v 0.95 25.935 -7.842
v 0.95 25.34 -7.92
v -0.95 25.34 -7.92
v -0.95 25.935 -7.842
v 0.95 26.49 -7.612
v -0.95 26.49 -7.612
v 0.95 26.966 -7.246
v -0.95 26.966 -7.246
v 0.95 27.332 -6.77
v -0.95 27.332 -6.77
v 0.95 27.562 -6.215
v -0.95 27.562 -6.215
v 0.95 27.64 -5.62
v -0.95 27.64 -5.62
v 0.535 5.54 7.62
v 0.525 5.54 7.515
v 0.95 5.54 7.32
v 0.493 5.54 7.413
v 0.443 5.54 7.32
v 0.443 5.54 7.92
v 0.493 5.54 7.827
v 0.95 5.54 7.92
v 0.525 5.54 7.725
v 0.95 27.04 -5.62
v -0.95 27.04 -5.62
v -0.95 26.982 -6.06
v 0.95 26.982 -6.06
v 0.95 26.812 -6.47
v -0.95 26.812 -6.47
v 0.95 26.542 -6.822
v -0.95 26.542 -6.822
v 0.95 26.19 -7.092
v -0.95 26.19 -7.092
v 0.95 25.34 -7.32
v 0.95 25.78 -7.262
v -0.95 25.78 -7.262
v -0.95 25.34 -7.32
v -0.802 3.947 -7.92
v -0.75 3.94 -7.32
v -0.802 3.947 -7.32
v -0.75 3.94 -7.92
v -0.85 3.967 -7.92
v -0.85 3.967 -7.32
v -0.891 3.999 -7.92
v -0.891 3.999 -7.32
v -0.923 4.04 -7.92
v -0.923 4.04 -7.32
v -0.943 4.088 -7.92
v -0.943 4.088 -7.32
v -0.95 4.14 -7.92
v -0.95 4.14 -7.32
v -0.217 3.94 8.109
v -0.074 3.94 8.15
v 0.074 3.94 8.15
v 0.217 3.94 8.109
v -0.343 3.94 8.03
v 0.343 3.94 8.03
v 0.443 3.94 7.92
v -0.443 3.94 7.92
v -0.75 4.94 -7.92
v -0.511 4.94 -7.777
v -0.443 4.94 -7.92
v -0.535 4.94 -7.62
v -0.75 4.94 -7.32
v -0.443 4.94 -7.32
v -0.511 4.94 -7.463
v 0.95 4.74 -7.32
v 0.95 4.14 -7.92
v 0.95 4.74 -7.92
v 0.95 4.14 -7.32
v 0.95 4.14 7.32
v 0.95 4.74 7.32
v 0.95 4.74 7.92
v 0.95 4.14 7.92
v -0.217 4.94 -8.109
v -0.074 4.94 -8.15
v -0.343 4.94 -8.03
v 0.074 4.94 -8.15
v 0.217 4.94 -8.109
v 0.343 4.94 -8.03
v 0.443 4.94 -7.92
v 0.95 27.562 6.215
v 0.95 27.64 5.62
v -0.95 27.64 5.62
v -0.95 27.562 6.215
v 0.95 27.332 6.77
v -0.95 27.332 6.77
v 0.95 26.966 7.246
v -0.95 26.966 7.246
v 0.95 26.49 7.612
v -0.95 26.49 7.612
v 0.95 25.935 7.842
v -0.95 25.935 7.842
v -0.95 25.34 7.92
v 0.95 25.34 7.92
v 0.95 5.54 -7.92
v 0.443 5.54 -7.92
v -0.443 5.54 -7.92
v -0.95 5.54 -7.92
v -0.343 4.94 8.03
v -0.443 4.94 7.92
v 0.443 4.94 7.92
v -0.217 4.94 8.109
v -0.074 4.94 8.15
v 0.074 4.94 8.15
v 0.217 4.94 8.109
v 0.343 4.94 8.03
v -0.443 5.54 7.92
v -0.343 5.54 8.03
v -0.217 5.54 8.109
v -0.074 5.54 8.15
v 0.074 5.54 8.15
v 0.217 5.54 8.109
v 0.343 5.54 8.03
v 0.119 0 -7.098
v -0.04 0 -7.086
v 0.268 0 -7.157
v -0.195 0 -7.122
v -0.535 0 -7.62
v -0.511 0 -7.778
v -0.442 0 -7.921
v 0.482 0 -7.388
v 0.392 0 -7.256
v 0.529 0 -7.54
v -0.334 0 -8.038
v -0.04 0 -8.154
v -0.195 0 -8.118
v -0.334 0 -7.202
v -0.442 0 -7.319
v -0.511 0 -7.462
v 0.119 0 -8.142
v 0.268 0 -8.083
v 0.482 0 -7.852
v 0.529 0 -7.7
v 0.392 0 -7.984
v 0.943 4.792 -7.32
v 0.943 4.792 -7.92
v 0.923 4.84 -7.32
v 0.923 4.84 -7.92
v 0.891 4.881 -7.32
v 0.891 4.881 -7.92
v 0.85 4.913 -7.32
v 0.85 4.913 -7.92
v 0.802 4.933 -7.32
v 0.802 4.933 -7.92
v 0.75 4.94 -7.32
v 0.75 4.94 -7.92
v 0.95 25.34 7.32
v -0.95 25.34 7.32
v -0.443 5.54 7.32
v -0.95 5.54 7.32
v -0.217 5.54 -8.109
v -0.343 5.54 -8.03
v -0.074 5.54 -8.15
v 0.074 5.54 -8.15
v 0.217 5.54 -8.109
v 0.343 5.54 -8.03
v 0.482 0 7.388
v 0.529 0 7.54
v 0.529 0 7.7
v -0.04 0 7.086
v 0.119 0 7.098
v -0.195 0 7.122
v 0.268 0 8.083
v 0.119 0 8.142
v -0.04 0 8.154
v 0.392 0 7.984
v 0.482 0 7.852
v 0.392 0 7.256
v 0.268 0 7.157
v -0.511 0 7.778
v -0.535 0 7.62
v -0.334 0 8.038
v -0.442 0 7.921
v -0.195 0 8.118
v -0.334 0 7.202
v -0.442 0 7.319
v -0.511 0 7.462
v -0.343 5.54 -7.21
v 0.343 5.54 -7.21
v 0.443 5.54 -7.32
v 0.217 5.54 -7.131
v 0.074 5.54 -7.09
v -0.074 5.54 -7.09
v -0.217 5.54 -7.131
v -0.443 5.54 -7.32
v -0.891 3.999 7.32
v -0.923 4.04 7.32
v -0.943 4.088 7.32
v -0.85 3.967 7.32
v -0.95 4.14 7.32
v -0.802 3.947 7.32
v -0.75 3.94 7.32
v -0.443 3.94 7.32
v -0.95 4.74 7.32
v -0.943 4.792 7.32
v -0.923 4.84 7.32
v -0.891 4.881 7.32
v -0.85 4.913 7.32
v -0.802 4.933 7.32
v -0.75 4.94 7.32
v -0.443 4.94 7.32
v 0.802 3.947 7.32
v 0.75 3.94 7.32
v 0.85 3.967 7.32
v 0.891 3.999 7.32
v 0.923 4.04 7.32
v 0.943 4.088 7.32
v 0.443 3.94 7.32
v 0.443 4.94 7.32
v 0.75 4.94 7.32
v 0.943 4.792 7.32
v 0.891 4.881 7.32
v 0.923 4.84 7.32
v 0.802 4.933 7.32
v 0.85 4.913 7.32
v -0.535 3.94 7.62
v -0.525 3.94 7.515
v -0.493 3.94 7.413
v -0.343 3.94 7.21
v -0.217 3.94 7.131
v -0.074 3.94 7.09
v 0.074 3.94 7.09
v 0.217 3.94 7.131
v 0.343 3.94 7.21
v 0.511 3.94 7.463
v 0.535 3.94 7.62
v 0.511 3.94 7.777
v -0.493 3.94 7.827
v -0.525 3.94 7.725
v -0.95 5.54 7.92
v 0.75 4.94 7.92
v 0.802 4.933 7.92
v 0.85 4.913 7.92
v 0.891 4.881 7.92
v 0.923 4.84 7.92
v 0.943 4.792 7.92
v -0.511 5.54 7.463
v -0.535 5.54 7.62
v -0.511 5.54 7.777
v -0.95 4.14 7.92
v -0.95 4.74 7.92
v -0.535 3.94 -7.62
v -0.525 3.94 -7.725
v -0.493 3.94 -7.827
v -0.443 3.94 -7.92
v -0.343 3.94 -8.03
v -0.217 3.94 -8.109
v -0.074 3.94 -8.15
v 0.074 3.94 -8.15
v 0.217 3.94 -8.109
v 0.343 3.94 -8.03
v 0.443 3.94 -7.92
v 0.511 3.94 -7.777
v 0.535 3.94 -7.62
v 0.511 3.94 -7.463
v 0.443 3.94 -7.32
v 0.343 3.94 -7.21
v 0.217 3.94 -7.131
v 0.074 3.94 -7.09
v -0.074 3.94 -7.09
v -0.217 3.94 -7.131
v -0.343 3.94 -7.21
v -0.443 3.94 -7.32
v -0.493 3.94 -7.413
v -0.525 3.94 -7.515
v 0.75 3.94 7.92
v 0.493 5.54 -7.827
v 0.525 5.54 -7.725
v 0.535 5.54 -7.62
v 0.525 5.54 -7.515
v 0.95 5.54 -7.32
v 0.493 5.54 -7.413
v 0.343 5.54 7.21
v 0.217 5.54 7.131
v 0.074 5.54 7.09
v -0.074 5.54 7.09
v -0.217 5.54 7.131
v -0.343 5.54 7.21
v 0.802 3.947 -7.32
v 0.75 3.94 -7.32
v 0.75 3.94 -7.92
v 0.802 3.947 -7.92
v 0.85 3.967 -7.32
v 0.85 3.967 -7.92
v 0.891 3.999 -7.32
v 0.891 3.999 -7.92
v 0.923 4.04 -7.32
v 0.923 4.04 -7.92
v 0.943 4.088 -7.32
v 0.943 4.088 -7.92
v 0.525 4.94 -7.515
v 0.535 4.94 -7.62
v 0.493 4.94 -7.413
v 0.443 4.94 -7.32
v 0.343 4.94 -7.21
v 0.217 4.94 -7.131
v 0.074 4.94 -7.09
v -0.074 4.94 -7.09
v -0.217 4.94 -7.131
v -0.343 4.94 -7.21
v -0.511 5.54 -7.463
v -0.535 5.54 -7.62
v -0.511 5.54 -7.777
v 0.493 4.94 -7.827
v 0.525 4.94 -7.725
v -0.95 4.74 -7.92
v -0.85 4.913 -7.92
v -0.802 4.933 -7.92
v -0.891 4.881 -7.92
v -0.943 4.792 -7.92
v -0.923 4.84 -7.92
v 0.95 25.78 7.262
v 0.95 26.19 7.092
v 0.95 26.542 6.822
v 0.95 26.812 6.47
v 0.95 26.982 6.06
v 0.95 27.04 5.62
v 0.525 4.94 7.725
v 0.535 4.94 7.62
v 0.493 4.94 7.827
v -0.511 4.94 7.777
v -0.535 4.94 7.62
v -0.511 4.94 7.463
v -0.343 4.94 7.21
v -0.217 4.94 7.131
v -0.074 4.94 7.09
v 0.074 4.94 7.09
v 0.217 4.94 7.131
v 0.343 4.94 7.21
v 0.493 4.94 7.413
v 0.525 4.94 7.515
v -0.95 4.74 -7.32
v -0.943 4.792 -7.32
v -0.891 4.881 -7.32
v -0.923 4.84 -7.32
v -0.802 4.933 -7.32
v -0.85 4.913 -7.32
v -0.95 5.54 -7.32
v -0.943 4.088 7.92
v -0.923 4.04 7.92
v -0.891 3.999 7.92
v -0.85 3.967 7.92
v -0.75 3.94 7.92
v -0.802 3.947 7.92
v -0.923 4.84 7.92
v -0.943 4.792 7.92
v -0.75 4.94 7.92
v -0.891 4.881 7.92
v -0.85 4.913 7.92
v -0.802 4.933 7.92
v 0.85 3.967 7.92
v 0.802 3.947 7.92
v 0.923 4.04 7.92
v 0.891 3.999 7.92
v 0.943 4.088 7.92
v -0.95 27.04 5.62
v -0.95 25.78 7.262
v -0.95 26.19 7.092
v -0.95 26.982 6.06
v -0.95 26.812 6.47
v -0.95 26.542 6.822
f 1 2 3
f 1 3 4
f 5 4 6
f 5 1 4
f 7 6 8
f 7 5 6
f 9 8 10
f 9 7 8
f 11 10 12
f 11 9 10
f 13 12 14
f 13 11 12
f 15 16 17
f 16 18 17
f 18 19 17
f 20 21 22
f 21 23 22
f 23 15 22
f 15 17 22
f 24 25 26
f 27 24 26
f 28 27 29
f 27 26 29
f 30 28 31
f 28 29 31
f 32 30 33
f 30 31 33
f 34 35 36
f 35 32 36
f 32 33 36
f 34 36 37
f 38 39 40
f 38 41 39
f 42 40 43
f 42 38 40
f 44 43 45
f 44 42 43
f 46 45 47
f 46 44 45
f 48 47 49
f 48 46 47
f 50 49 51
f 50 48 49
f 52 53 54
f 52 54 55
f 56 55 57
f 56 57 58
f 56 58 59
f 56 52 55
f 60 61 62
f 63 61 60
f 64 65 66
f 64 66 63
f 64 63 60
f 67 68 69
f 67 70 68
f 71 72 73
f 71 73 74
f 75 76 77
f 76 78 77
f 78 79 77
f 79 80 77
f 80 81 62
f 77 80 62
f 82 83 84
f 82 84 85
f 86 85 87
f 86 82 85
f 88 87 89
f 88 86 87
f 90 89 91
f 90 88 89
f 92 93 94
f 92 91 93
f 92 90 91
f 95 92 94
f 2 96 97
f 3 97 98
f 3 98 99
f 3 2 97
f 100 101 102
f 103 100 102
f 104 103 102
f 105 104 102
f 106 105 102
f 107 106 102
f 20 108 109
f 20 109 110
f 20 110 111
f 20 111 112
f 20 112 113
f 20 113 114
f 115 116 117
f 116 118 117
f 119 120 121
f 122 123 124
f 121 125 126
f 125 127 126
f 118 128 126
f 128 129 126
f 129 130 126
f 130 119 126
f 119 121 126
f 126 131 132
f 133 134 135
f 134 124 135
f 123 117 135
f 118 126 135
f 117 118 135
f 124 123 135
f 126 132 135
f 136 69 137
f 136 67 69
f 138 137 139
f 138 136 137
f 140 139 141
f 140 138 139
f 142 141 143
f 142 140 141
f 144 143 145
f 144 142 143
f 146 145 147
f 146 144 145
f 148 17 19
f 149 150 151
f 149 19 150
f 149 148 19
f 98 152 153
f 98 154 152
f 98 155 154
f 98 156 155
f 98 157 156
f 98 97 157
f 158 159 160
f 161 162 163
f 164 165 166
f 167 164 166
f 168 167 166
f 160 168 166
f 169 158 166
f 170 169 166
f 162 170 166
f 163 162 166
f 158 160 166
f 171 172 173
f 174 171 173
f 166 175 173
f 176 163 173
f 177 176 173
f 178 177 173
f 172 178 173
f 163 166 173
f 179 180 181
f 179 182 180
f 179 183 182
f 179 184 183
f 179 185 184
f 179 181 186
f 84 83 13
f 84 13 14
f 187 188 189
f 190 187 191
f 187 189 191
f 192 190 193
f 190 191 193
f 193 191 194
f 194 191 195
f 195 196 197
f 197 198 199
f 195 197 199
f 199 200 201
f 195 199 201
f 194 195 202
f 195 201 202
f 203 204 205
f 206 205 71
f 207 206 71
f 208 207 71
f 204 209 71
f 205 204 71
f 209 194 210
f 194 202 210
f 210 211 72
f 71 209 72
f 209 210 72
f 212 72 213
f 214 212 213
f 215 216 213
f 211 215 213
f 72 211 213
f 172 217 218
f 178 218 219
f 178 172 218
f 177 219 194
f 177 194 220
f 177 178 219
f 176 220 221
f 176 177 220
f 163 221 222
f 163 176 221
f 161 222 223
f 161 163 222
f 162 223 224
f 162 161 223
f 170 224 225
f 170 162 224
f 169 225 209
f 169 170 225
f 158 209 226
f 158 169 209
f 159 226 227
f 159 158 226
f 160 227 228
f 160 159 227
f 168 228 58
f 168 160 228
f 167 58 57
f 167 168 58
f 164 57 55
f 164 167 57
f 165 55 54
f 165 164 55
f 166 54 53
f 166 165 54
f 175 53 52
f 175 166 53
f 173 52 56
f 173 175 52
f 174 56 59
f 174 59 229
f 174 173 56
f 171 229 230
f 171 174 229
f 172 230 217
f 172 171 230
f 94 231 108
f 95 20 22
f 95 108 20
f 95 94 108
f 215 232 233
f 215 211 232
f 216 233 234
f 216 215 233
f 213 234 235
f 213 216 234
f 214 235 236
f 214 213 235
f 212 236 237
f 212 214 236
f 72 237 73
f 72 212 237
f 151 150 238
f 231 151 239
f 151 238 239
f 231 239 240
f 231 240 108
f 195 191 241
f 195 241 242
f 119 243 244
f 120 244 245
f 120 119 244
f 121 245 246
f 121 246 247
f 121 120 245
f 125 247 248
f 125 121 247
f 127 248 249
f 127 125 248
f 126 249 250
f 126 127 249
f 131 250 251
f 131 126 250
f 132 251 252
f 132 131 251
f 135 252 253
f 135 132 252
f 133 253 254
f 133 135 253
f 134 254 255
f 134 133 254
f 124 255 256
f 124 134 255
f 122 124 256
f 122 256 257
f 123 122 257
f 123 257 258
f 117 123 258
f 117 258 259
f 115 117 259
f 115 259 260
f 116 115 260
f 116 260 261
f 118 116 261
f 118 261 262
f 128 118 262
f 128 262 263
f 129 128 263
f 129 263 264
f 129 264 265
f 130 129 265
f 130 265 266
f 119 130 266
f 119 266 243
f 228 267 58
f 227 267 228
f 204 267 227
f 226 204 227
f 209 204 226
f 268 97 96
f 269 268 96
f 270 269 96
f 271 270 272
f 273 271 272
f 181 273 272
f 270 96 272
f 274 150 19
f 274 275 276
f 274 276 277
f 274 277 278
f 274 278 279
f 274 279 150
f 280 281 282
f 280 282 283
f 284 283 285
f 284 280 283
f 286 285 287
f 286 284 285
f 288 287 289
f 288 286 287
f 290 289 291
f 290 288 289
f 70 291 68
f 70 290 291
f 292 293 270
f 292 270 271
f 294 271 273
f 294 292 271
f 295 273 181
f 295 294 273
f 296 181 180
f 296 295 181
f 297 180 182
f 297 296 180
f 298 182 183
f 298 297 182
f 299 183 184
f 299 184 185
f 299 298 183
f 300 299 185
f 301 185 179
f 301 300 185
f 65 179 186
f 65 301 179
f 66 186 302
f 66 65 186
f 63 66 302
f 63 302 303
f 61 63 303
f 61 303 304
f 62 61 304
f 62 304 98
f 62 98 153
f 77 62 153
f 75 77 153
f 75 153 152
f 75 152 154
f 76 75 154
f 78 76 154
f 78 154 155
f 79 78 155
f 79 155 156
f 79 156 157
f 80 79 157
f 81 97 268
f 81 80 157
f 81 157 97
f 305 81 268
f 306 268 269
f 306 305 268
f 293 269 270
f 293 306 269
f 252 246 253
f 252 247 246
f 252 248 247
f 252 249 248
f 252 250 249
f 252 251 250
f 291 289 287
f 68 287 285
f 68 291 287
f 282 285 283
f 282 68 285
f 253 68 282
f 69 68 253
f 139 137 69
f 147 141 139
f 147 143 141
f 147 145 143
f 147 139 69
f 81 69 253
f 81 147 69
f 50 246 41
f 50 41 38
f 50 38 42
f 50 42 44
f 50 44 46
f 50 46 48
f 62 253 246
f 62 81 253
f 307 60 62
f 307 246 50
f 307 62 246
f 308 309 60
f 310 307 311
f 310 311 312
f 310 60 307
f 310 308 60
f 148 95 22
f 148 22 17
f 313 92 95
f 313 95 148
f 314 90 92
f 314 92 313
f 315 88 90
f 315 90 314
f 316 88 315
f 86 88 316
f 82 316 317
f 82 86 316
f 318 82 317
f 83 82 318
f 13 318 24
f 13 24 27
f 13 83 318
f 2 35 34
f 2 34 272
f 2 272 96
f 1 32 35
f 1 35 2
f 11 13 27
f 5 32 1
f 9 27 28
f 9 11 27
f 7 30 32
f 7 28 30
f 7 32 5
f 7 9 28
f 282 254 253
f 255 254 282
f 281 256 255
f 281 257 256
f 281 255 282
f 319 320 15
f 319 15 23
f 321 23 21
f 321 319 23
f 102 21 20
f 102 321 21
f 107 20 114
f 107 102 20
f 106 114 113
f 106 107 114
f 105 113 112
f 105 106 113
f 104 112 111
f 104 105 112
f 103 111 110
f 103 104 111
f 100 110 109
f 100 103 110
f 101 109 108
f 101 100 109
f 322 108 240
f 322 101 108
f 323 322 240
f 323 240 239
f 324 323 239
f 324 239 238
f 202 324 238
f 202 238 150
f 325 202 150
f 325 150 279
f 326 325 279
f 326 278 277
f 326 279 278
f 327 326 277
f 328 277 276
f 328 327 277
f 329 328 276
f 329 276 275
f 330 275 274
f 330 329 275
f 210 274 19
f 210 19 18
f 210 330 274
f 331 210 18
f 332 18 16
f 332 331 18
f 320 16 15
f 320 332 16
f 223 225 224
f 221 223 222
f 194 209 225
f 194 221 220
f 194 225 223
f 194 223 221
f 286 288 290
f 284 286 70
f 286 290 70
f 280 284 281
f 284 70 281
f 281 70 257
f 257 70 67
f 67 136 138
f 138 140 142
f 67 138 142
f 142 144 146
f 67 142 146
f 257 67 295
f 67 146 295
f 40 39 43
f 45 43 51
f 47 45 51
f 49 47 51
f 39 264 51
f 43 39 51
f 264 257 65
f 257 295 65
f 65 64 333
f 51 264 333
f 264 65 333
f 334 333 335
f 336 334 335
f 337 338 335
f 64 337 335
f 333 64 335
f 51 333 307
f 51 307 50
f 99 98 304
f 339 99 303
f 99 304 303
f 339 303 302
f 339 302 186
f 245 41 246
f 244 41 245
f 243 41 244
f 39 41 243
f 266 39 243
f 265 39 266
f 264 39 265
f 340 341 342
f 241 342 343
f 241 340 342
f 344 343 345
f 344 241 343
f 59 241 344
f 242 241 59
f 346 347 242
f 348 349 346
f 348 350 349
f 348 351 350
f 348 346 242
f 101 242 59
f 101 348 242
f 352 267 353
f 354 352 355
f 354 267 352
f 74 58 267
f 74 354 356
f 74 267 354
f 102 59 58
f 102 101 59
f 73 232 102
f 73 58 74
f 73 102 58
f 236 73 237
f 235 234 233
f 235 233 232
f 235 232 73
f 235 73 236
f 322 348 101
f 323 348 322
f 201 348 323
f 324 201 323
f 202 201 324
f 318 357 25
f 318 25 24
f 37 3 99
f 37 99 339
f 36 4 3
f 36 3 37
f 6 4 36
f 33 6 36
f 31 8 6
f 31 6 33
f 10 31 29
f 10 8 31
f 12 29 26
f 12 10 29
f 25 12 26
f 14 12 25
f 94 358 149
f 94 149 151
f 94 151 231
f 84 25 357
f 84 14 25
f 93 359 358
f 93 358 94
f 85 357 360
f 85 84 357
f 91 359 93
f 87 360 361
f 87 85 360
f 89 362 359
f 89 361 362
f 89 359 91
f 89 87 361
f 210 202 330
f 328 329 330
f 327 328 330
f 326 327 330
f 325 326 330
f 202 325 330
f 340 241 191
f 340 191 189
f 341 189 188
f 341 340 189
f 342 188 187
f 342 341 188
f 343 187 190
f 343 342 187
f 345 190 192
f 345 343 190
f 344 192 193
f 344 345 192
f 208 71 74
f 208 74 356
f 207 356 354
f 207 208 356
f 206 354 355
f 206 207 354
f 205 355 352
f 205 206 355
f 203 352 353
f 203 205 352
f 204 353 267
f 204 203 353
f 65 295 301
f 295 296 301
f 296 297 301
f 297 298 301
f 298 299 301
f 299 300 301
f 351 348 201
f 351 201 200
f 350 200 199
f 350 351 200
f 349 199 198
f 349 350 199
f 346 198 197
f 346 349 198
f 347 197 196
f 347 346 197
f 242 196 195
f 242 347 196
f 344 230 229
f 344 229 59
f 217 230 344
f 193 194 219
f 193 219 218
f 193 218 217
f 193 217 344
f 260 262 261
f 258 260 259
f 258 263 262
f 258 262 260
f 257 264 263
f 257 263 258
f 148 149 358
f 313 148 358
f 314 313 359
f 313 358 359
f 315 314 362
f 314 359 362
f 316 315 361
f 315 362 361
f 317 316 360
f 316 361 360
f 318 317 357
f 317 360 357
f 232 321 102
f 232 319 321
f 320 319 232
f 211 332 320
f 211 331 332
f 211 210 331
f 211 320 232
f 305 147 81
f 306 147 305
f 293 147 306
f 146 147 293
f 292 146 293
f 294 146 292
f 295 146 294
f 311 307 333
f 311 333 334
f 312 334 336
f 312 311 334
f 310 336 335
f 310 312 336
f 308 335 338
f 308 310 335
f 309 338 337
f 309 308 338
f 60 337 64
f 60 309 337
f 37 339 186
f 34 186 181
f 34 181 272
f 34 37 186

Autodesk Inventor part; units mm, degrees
ref_plane "YZ Plane" through (0, 0, 0) normal (1, 0, 0) x (0, 1, 0)
ref_plane "XZ Plane" through (0, 0, 0) normal (0, 1, 0) x (-1, 0, 0)
sketch "Sketch1" plane through (0, 0, 0) normal (0, 1, 0) x (-1, 0, 0)
  circle A0 centre (0, 7.62) radius 0.535
  point P0 (0, 0)
  dimension "d0" = 1.07
  dimension "d1" = 7.62
extrude "Extrusion1" add sketch "Sketch1" along normal blind 3.94
ref_plane "Work Plane1" through (0, 0, 7.62) normal (0, 0, 1) x (1, 0, 0)
sketch "Sketch2" plane through (0, 0, 7.62) normal (0, 0, 1) x (1, 0, 0)
  line L0 (-0.95, 4.94) -> (0.95, 4.94)
  line L1 (0.95, 4.94) -> (0.95, 3.94)
  line L2 (0.95, 3.94) -> (-0.95, 3.94)
  line L3 (-0.95, 3.94) -> (-0.95, 4.94)
  line L4 (-0.535, 0) -> (0.535, 0) projected
  line L5 (0, 0) -> (0, -0.058)
  dimension "d5" = 3.94
  dimension "d6" = 1.9
  dimension "d7" = 0.95
  dimension "d8" = 1
extrude "Extrusion2" add sketch "Sketch2" along normal mid plane 0.6
fillet "Fillet1" radius 0.2 4 edges at (0.95, 3.94, 7.62) (0.95, 4.94, 7.62) (-0.95, 4.94, 7.62) (-0.95, 3.94, 7.62)
sketch "Sketch3" plane through (-0.75, 4.94, 7.92) normal (0, 1, 0) x (1, 0, 0)
  circle A0 centre (0.75, 0.3) radius 0.535
  point P0 (0.75, 7.92)
  dimension "d12" = 1.07
  dimension "d13" = 7.62
extrude "Extrusion3" add sketch "Sketch3" along normal blind 0.6
sketch "Sketch4" plane through (0, 5.54, 7.62) normal (0, 1, 0) x (1, 0, 0)
  line L0 (0.75, 0.3) -> (0.95, 0.3) projected
  line L1 (-0.95, -0.3) -> (0.95, -0.3)
  line L2 (0.95, -0.3) -> (0.95, 0.3)
  line L3 (0.95, 0.3) -> (-0.95, 0.3)
  line L4 (-0.95, 0.3) -> (-0.95, -0.3)
  point P0 (0, 7.62)
sketch "Sketch5" plane through (0, 0, 0) normal (1, 0, 0) x (0, 1, 0)
  line L0 (27.34, 0) -> (27.34, 5.62)
  line L1 (3.94, 7.085) -> (3.94, 7.32) projected
  line L2 (5.54, 7.085) -> (5.54, 8.155) projected
  line L3 (5.54, 7.62) -> (25.34, 7.62)
  arc A0 (27.34, 5.62) -> (25.34, 7.62) centre (25.34, 5.62) ccw
  point P0 (0, 0)
  dimension "d16" = 23.4
  dimension "d17" = 2
sweep "Sweep1" add profiles "Sketch4" path "Sketch5" path curves L3 A0 L0
mirror "Mirror1" about plane through (0, 0, 0) normal (0, 0, 1) of "Sweep1", "Extrusion3", "Fillet1", "Extrusion2", "Extrusion1"
ref_plane "Work Plane2" through (0, 0, -7.62) normal (0, 0, 1) x (1, 0, 0)
properties part number "OAR3R010FLF_CurrentSense"
